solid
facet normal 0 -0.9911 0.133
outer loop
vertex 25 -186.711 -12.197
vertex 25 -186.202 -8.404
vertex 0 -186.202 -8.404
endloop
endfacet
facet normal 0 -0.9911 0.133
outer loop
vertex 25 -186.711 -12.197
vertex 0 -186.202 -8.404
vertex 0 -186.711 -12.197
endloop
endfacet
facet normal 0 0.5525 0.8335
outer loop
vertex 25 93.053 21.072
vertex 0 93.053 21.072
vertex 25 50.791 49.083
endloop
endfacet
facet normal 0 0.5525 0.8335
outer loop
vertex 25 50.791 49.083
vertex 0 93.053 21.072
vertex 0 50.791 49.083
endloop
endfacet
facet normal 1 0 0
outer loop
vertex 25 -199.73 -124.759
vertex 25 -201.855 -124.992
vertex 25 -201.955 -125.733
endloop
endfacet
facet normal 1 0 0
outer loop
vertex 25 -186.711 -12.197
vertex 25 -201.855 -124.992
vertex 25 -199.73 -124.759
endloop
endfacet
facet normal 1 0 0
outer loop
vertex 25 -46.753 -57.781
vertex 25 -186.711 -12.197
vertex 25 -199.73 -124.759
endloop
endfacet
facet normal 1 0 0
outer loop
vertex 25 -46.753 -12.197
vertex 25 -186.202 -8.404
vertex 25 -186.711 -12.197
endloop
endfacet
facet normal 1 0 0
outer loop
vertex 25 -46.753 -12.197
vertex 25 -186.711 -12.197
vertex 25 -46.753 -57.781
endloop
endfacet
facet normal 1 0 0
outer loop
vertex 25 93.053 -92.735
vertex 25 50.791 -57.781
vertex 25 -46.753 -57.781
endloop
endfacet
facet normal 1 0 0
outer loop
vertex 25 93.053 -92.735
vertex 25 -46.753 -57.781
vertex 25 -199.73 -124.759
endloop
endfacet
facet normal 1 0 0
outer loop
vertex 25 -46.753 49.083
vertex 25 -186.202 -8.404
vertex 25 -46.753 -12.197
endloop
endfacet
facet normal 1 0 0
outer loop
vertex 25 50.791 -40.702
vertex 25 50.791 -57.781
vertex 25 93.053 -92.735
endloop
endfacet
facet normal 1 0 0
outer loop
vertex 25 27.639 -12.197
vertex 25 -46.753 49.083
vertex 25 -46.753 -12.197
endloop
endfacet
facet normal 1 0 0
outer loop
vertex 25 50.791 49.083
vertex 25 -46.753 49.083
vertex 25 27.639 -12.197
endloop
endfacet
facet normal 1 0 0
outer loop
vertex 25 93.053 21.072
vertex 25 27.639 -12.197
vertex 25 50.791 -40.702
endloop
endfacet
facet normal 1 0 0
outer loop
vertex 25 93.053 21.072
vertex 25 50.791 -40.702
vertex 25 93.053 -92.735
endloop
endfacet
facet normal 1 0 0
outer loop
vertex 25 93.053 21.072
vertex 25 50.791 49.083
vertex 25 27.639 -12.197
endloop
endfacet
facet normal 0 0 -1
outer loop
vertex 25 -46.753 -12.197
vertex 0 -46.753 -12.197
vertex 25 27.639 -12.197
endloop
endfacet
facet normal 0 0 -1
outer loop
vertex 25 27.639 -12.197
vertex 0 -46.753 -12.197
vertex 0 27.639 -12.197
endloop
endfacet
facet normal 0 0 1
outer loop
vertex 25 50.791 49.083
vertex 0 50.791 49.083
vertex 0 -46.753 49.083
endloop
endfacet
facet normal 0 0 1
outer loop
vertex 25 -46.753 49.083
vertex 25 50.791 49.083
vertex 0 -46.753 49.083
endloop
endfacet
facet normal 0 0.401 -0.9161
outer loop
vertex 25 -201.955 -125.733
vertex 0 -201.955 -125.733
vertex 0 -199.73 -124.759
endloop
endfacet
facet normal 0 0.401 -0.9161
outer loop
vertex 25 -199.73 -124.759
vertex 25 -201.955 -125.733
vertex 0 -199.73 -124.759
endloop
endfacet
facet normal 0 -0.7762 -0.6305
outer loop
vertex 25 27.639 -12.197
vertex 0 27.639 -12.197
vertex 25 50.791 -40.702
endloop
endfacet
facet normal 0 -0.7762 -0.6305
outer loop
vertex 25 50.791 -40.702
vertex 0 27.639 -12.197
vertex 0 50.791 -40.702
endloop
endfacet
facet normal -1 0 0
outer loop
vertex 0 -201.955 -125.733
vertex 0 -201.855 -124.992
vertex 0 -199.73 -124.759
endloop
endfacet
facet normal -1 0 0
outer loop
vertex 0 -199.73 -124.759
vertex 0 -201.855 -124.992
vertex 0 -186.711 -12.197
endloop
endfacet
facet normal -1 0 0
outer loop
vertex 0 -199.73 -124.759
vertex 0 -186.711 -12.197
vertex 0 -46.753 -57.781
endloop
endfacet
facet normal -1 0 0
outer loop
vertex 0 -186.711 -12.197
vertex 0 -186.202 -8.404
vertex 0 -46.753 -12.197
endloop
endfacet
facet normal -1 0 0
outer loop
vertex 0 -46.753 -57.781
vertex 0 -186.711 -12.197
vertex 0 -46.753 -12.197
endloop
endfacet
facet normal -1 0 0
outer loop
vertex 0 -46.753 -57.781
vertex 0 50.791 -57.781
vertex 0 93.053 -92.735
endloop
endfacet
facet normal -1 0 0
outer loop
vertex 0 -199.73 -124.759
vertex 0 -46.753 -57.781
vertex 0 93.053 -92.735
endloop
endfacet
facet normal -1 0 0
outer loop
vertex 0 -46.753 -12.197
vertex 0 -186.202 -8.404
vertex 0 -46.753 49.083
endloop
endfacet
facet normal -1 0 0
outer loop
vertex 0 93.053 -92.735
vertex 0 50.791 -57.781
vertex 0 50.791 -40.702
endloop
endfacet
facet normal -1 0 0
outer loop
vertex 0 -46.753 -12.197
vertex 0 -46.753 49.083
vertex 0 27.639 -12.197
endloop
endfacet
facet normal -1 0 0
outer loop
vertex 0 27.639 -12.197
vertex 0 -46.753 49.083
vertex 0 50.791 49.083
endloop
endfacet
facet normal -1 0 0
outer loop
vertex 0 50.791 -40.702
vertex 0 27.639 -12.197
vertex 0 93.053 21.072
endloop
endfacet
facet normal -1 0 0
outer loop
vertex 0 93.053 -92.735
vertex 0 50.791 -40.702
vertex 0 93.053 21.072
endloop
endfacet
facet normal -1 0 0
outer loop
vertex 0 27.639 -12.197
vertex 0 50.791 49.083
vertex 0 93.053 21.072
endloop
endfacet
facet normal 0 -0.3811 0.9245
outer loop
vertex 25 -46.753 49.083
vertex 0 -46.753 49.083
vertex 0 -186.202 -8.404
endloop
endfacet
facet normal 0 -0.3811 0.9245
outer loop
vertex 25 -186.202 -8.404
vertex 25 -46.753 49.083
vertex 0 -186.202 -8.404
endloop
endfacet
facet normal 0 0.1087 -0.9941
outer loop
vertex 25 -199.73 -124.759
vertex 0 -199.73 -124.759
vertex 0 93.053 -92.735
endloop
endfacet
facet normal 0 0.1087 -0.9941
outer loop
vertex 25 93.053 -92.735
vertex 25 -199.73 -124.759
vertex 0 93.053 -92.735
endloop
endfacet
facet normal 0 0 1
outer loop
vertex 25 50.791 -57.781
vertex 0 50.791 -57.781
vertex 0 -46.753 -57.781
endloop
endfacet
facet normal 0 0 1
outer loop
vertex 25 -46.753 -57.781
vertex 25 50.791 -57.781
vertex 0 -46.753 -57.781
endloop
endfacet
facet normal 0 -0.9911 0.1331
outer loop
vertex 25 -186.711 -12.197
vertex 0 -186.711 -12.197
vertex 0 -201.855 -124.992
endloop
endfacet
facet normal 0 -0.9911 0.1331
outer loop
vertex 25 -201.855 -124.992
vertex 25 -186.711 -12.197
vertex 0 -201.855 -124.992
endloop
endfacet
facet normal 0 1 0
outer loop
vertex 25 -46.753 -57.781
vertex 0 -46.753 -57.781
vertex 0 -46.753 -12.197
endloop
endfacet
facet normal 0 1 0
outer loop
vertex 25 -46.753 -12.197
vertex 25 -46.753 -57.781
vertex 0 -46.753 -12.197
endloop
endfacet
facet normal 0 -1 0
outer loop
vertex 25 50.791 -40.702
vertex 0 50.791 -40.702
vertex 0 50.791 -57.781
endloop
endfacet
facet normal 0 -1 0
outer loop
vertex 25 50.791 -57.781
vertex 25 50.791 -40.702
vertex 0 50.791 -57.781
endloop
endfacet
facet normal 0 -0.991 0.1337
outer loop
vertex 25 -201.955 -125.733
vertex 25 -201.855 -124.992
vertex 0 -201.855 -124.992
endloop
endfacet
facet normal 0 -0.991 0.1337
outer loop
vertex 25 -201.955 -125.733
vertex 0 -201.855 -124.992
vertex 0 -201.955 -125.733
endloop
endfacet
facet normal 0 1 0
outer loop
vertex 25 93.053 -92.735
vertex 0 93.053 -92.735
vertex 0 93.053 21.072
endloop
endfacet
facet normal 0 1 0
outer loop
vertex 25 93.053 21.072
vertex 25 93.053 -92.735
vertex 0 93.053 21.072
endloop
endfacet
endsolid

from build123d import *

# Parameters (mm, degrees)
F1_DEPTH = 25


with BuildPart() as f1:
    # F0 (on Right) → F1 (new body)
    with BuildSketch(Plane.YZ):
        Polygon((50.7914237678, 49.0828417242), (47.3742634058, 49.0828417242), (-46.7529594898, 49.0828417242), (-46.7529594898, -12.1967571052), (27.6393722743, -12.1967571052), align=None)
        Polygon((-46.7529594898, -12.1967571052), (-46.7529594898, 49.0828417242), (-186.2022727728, -8.4043648094), (-186.711434477, -12.1967571052), align=None)
        Polygon((93.0533483624, 21.0719704628), (50.7914237678, 49.0828417242), (50.7914237678, -40.7016065636), (93.0533483624, -92.734567821), align=None)
        Polygon((50.7914237678, -40.7016065636), (50.7914237678, 49.0828417242), (27.6393722743, -12.1967571052), align=None)
        Polygon((-46.7529594898, -57.7810667455), (-46.7529594898, -12.1967571052), (-186.711434477, -12.1967571052), (-201.8551233379, -124.9915892651), (-199.729913905, -124.7591343415), align=None)
        Polygon((93.0533483624, -92.734567821), (50.7914237678, -40.7016065636), (50.7914237678, -57.7810667455), align=None)
        Polygon((50.7914237678, -57.7810667455), (-46.7529594898, -57.7810667455), (-199.729913905, -124.7591343415), (93.0533483624, -92.734567821), align=None)
        Polygon((-201.9546926022, -125.7332116365), (-199.729913905, -124.7591343415), (-201.8551233379, -124.9915892651), align=None)
    extrude(amount=F1_DEPTH)


solid = f1.part
